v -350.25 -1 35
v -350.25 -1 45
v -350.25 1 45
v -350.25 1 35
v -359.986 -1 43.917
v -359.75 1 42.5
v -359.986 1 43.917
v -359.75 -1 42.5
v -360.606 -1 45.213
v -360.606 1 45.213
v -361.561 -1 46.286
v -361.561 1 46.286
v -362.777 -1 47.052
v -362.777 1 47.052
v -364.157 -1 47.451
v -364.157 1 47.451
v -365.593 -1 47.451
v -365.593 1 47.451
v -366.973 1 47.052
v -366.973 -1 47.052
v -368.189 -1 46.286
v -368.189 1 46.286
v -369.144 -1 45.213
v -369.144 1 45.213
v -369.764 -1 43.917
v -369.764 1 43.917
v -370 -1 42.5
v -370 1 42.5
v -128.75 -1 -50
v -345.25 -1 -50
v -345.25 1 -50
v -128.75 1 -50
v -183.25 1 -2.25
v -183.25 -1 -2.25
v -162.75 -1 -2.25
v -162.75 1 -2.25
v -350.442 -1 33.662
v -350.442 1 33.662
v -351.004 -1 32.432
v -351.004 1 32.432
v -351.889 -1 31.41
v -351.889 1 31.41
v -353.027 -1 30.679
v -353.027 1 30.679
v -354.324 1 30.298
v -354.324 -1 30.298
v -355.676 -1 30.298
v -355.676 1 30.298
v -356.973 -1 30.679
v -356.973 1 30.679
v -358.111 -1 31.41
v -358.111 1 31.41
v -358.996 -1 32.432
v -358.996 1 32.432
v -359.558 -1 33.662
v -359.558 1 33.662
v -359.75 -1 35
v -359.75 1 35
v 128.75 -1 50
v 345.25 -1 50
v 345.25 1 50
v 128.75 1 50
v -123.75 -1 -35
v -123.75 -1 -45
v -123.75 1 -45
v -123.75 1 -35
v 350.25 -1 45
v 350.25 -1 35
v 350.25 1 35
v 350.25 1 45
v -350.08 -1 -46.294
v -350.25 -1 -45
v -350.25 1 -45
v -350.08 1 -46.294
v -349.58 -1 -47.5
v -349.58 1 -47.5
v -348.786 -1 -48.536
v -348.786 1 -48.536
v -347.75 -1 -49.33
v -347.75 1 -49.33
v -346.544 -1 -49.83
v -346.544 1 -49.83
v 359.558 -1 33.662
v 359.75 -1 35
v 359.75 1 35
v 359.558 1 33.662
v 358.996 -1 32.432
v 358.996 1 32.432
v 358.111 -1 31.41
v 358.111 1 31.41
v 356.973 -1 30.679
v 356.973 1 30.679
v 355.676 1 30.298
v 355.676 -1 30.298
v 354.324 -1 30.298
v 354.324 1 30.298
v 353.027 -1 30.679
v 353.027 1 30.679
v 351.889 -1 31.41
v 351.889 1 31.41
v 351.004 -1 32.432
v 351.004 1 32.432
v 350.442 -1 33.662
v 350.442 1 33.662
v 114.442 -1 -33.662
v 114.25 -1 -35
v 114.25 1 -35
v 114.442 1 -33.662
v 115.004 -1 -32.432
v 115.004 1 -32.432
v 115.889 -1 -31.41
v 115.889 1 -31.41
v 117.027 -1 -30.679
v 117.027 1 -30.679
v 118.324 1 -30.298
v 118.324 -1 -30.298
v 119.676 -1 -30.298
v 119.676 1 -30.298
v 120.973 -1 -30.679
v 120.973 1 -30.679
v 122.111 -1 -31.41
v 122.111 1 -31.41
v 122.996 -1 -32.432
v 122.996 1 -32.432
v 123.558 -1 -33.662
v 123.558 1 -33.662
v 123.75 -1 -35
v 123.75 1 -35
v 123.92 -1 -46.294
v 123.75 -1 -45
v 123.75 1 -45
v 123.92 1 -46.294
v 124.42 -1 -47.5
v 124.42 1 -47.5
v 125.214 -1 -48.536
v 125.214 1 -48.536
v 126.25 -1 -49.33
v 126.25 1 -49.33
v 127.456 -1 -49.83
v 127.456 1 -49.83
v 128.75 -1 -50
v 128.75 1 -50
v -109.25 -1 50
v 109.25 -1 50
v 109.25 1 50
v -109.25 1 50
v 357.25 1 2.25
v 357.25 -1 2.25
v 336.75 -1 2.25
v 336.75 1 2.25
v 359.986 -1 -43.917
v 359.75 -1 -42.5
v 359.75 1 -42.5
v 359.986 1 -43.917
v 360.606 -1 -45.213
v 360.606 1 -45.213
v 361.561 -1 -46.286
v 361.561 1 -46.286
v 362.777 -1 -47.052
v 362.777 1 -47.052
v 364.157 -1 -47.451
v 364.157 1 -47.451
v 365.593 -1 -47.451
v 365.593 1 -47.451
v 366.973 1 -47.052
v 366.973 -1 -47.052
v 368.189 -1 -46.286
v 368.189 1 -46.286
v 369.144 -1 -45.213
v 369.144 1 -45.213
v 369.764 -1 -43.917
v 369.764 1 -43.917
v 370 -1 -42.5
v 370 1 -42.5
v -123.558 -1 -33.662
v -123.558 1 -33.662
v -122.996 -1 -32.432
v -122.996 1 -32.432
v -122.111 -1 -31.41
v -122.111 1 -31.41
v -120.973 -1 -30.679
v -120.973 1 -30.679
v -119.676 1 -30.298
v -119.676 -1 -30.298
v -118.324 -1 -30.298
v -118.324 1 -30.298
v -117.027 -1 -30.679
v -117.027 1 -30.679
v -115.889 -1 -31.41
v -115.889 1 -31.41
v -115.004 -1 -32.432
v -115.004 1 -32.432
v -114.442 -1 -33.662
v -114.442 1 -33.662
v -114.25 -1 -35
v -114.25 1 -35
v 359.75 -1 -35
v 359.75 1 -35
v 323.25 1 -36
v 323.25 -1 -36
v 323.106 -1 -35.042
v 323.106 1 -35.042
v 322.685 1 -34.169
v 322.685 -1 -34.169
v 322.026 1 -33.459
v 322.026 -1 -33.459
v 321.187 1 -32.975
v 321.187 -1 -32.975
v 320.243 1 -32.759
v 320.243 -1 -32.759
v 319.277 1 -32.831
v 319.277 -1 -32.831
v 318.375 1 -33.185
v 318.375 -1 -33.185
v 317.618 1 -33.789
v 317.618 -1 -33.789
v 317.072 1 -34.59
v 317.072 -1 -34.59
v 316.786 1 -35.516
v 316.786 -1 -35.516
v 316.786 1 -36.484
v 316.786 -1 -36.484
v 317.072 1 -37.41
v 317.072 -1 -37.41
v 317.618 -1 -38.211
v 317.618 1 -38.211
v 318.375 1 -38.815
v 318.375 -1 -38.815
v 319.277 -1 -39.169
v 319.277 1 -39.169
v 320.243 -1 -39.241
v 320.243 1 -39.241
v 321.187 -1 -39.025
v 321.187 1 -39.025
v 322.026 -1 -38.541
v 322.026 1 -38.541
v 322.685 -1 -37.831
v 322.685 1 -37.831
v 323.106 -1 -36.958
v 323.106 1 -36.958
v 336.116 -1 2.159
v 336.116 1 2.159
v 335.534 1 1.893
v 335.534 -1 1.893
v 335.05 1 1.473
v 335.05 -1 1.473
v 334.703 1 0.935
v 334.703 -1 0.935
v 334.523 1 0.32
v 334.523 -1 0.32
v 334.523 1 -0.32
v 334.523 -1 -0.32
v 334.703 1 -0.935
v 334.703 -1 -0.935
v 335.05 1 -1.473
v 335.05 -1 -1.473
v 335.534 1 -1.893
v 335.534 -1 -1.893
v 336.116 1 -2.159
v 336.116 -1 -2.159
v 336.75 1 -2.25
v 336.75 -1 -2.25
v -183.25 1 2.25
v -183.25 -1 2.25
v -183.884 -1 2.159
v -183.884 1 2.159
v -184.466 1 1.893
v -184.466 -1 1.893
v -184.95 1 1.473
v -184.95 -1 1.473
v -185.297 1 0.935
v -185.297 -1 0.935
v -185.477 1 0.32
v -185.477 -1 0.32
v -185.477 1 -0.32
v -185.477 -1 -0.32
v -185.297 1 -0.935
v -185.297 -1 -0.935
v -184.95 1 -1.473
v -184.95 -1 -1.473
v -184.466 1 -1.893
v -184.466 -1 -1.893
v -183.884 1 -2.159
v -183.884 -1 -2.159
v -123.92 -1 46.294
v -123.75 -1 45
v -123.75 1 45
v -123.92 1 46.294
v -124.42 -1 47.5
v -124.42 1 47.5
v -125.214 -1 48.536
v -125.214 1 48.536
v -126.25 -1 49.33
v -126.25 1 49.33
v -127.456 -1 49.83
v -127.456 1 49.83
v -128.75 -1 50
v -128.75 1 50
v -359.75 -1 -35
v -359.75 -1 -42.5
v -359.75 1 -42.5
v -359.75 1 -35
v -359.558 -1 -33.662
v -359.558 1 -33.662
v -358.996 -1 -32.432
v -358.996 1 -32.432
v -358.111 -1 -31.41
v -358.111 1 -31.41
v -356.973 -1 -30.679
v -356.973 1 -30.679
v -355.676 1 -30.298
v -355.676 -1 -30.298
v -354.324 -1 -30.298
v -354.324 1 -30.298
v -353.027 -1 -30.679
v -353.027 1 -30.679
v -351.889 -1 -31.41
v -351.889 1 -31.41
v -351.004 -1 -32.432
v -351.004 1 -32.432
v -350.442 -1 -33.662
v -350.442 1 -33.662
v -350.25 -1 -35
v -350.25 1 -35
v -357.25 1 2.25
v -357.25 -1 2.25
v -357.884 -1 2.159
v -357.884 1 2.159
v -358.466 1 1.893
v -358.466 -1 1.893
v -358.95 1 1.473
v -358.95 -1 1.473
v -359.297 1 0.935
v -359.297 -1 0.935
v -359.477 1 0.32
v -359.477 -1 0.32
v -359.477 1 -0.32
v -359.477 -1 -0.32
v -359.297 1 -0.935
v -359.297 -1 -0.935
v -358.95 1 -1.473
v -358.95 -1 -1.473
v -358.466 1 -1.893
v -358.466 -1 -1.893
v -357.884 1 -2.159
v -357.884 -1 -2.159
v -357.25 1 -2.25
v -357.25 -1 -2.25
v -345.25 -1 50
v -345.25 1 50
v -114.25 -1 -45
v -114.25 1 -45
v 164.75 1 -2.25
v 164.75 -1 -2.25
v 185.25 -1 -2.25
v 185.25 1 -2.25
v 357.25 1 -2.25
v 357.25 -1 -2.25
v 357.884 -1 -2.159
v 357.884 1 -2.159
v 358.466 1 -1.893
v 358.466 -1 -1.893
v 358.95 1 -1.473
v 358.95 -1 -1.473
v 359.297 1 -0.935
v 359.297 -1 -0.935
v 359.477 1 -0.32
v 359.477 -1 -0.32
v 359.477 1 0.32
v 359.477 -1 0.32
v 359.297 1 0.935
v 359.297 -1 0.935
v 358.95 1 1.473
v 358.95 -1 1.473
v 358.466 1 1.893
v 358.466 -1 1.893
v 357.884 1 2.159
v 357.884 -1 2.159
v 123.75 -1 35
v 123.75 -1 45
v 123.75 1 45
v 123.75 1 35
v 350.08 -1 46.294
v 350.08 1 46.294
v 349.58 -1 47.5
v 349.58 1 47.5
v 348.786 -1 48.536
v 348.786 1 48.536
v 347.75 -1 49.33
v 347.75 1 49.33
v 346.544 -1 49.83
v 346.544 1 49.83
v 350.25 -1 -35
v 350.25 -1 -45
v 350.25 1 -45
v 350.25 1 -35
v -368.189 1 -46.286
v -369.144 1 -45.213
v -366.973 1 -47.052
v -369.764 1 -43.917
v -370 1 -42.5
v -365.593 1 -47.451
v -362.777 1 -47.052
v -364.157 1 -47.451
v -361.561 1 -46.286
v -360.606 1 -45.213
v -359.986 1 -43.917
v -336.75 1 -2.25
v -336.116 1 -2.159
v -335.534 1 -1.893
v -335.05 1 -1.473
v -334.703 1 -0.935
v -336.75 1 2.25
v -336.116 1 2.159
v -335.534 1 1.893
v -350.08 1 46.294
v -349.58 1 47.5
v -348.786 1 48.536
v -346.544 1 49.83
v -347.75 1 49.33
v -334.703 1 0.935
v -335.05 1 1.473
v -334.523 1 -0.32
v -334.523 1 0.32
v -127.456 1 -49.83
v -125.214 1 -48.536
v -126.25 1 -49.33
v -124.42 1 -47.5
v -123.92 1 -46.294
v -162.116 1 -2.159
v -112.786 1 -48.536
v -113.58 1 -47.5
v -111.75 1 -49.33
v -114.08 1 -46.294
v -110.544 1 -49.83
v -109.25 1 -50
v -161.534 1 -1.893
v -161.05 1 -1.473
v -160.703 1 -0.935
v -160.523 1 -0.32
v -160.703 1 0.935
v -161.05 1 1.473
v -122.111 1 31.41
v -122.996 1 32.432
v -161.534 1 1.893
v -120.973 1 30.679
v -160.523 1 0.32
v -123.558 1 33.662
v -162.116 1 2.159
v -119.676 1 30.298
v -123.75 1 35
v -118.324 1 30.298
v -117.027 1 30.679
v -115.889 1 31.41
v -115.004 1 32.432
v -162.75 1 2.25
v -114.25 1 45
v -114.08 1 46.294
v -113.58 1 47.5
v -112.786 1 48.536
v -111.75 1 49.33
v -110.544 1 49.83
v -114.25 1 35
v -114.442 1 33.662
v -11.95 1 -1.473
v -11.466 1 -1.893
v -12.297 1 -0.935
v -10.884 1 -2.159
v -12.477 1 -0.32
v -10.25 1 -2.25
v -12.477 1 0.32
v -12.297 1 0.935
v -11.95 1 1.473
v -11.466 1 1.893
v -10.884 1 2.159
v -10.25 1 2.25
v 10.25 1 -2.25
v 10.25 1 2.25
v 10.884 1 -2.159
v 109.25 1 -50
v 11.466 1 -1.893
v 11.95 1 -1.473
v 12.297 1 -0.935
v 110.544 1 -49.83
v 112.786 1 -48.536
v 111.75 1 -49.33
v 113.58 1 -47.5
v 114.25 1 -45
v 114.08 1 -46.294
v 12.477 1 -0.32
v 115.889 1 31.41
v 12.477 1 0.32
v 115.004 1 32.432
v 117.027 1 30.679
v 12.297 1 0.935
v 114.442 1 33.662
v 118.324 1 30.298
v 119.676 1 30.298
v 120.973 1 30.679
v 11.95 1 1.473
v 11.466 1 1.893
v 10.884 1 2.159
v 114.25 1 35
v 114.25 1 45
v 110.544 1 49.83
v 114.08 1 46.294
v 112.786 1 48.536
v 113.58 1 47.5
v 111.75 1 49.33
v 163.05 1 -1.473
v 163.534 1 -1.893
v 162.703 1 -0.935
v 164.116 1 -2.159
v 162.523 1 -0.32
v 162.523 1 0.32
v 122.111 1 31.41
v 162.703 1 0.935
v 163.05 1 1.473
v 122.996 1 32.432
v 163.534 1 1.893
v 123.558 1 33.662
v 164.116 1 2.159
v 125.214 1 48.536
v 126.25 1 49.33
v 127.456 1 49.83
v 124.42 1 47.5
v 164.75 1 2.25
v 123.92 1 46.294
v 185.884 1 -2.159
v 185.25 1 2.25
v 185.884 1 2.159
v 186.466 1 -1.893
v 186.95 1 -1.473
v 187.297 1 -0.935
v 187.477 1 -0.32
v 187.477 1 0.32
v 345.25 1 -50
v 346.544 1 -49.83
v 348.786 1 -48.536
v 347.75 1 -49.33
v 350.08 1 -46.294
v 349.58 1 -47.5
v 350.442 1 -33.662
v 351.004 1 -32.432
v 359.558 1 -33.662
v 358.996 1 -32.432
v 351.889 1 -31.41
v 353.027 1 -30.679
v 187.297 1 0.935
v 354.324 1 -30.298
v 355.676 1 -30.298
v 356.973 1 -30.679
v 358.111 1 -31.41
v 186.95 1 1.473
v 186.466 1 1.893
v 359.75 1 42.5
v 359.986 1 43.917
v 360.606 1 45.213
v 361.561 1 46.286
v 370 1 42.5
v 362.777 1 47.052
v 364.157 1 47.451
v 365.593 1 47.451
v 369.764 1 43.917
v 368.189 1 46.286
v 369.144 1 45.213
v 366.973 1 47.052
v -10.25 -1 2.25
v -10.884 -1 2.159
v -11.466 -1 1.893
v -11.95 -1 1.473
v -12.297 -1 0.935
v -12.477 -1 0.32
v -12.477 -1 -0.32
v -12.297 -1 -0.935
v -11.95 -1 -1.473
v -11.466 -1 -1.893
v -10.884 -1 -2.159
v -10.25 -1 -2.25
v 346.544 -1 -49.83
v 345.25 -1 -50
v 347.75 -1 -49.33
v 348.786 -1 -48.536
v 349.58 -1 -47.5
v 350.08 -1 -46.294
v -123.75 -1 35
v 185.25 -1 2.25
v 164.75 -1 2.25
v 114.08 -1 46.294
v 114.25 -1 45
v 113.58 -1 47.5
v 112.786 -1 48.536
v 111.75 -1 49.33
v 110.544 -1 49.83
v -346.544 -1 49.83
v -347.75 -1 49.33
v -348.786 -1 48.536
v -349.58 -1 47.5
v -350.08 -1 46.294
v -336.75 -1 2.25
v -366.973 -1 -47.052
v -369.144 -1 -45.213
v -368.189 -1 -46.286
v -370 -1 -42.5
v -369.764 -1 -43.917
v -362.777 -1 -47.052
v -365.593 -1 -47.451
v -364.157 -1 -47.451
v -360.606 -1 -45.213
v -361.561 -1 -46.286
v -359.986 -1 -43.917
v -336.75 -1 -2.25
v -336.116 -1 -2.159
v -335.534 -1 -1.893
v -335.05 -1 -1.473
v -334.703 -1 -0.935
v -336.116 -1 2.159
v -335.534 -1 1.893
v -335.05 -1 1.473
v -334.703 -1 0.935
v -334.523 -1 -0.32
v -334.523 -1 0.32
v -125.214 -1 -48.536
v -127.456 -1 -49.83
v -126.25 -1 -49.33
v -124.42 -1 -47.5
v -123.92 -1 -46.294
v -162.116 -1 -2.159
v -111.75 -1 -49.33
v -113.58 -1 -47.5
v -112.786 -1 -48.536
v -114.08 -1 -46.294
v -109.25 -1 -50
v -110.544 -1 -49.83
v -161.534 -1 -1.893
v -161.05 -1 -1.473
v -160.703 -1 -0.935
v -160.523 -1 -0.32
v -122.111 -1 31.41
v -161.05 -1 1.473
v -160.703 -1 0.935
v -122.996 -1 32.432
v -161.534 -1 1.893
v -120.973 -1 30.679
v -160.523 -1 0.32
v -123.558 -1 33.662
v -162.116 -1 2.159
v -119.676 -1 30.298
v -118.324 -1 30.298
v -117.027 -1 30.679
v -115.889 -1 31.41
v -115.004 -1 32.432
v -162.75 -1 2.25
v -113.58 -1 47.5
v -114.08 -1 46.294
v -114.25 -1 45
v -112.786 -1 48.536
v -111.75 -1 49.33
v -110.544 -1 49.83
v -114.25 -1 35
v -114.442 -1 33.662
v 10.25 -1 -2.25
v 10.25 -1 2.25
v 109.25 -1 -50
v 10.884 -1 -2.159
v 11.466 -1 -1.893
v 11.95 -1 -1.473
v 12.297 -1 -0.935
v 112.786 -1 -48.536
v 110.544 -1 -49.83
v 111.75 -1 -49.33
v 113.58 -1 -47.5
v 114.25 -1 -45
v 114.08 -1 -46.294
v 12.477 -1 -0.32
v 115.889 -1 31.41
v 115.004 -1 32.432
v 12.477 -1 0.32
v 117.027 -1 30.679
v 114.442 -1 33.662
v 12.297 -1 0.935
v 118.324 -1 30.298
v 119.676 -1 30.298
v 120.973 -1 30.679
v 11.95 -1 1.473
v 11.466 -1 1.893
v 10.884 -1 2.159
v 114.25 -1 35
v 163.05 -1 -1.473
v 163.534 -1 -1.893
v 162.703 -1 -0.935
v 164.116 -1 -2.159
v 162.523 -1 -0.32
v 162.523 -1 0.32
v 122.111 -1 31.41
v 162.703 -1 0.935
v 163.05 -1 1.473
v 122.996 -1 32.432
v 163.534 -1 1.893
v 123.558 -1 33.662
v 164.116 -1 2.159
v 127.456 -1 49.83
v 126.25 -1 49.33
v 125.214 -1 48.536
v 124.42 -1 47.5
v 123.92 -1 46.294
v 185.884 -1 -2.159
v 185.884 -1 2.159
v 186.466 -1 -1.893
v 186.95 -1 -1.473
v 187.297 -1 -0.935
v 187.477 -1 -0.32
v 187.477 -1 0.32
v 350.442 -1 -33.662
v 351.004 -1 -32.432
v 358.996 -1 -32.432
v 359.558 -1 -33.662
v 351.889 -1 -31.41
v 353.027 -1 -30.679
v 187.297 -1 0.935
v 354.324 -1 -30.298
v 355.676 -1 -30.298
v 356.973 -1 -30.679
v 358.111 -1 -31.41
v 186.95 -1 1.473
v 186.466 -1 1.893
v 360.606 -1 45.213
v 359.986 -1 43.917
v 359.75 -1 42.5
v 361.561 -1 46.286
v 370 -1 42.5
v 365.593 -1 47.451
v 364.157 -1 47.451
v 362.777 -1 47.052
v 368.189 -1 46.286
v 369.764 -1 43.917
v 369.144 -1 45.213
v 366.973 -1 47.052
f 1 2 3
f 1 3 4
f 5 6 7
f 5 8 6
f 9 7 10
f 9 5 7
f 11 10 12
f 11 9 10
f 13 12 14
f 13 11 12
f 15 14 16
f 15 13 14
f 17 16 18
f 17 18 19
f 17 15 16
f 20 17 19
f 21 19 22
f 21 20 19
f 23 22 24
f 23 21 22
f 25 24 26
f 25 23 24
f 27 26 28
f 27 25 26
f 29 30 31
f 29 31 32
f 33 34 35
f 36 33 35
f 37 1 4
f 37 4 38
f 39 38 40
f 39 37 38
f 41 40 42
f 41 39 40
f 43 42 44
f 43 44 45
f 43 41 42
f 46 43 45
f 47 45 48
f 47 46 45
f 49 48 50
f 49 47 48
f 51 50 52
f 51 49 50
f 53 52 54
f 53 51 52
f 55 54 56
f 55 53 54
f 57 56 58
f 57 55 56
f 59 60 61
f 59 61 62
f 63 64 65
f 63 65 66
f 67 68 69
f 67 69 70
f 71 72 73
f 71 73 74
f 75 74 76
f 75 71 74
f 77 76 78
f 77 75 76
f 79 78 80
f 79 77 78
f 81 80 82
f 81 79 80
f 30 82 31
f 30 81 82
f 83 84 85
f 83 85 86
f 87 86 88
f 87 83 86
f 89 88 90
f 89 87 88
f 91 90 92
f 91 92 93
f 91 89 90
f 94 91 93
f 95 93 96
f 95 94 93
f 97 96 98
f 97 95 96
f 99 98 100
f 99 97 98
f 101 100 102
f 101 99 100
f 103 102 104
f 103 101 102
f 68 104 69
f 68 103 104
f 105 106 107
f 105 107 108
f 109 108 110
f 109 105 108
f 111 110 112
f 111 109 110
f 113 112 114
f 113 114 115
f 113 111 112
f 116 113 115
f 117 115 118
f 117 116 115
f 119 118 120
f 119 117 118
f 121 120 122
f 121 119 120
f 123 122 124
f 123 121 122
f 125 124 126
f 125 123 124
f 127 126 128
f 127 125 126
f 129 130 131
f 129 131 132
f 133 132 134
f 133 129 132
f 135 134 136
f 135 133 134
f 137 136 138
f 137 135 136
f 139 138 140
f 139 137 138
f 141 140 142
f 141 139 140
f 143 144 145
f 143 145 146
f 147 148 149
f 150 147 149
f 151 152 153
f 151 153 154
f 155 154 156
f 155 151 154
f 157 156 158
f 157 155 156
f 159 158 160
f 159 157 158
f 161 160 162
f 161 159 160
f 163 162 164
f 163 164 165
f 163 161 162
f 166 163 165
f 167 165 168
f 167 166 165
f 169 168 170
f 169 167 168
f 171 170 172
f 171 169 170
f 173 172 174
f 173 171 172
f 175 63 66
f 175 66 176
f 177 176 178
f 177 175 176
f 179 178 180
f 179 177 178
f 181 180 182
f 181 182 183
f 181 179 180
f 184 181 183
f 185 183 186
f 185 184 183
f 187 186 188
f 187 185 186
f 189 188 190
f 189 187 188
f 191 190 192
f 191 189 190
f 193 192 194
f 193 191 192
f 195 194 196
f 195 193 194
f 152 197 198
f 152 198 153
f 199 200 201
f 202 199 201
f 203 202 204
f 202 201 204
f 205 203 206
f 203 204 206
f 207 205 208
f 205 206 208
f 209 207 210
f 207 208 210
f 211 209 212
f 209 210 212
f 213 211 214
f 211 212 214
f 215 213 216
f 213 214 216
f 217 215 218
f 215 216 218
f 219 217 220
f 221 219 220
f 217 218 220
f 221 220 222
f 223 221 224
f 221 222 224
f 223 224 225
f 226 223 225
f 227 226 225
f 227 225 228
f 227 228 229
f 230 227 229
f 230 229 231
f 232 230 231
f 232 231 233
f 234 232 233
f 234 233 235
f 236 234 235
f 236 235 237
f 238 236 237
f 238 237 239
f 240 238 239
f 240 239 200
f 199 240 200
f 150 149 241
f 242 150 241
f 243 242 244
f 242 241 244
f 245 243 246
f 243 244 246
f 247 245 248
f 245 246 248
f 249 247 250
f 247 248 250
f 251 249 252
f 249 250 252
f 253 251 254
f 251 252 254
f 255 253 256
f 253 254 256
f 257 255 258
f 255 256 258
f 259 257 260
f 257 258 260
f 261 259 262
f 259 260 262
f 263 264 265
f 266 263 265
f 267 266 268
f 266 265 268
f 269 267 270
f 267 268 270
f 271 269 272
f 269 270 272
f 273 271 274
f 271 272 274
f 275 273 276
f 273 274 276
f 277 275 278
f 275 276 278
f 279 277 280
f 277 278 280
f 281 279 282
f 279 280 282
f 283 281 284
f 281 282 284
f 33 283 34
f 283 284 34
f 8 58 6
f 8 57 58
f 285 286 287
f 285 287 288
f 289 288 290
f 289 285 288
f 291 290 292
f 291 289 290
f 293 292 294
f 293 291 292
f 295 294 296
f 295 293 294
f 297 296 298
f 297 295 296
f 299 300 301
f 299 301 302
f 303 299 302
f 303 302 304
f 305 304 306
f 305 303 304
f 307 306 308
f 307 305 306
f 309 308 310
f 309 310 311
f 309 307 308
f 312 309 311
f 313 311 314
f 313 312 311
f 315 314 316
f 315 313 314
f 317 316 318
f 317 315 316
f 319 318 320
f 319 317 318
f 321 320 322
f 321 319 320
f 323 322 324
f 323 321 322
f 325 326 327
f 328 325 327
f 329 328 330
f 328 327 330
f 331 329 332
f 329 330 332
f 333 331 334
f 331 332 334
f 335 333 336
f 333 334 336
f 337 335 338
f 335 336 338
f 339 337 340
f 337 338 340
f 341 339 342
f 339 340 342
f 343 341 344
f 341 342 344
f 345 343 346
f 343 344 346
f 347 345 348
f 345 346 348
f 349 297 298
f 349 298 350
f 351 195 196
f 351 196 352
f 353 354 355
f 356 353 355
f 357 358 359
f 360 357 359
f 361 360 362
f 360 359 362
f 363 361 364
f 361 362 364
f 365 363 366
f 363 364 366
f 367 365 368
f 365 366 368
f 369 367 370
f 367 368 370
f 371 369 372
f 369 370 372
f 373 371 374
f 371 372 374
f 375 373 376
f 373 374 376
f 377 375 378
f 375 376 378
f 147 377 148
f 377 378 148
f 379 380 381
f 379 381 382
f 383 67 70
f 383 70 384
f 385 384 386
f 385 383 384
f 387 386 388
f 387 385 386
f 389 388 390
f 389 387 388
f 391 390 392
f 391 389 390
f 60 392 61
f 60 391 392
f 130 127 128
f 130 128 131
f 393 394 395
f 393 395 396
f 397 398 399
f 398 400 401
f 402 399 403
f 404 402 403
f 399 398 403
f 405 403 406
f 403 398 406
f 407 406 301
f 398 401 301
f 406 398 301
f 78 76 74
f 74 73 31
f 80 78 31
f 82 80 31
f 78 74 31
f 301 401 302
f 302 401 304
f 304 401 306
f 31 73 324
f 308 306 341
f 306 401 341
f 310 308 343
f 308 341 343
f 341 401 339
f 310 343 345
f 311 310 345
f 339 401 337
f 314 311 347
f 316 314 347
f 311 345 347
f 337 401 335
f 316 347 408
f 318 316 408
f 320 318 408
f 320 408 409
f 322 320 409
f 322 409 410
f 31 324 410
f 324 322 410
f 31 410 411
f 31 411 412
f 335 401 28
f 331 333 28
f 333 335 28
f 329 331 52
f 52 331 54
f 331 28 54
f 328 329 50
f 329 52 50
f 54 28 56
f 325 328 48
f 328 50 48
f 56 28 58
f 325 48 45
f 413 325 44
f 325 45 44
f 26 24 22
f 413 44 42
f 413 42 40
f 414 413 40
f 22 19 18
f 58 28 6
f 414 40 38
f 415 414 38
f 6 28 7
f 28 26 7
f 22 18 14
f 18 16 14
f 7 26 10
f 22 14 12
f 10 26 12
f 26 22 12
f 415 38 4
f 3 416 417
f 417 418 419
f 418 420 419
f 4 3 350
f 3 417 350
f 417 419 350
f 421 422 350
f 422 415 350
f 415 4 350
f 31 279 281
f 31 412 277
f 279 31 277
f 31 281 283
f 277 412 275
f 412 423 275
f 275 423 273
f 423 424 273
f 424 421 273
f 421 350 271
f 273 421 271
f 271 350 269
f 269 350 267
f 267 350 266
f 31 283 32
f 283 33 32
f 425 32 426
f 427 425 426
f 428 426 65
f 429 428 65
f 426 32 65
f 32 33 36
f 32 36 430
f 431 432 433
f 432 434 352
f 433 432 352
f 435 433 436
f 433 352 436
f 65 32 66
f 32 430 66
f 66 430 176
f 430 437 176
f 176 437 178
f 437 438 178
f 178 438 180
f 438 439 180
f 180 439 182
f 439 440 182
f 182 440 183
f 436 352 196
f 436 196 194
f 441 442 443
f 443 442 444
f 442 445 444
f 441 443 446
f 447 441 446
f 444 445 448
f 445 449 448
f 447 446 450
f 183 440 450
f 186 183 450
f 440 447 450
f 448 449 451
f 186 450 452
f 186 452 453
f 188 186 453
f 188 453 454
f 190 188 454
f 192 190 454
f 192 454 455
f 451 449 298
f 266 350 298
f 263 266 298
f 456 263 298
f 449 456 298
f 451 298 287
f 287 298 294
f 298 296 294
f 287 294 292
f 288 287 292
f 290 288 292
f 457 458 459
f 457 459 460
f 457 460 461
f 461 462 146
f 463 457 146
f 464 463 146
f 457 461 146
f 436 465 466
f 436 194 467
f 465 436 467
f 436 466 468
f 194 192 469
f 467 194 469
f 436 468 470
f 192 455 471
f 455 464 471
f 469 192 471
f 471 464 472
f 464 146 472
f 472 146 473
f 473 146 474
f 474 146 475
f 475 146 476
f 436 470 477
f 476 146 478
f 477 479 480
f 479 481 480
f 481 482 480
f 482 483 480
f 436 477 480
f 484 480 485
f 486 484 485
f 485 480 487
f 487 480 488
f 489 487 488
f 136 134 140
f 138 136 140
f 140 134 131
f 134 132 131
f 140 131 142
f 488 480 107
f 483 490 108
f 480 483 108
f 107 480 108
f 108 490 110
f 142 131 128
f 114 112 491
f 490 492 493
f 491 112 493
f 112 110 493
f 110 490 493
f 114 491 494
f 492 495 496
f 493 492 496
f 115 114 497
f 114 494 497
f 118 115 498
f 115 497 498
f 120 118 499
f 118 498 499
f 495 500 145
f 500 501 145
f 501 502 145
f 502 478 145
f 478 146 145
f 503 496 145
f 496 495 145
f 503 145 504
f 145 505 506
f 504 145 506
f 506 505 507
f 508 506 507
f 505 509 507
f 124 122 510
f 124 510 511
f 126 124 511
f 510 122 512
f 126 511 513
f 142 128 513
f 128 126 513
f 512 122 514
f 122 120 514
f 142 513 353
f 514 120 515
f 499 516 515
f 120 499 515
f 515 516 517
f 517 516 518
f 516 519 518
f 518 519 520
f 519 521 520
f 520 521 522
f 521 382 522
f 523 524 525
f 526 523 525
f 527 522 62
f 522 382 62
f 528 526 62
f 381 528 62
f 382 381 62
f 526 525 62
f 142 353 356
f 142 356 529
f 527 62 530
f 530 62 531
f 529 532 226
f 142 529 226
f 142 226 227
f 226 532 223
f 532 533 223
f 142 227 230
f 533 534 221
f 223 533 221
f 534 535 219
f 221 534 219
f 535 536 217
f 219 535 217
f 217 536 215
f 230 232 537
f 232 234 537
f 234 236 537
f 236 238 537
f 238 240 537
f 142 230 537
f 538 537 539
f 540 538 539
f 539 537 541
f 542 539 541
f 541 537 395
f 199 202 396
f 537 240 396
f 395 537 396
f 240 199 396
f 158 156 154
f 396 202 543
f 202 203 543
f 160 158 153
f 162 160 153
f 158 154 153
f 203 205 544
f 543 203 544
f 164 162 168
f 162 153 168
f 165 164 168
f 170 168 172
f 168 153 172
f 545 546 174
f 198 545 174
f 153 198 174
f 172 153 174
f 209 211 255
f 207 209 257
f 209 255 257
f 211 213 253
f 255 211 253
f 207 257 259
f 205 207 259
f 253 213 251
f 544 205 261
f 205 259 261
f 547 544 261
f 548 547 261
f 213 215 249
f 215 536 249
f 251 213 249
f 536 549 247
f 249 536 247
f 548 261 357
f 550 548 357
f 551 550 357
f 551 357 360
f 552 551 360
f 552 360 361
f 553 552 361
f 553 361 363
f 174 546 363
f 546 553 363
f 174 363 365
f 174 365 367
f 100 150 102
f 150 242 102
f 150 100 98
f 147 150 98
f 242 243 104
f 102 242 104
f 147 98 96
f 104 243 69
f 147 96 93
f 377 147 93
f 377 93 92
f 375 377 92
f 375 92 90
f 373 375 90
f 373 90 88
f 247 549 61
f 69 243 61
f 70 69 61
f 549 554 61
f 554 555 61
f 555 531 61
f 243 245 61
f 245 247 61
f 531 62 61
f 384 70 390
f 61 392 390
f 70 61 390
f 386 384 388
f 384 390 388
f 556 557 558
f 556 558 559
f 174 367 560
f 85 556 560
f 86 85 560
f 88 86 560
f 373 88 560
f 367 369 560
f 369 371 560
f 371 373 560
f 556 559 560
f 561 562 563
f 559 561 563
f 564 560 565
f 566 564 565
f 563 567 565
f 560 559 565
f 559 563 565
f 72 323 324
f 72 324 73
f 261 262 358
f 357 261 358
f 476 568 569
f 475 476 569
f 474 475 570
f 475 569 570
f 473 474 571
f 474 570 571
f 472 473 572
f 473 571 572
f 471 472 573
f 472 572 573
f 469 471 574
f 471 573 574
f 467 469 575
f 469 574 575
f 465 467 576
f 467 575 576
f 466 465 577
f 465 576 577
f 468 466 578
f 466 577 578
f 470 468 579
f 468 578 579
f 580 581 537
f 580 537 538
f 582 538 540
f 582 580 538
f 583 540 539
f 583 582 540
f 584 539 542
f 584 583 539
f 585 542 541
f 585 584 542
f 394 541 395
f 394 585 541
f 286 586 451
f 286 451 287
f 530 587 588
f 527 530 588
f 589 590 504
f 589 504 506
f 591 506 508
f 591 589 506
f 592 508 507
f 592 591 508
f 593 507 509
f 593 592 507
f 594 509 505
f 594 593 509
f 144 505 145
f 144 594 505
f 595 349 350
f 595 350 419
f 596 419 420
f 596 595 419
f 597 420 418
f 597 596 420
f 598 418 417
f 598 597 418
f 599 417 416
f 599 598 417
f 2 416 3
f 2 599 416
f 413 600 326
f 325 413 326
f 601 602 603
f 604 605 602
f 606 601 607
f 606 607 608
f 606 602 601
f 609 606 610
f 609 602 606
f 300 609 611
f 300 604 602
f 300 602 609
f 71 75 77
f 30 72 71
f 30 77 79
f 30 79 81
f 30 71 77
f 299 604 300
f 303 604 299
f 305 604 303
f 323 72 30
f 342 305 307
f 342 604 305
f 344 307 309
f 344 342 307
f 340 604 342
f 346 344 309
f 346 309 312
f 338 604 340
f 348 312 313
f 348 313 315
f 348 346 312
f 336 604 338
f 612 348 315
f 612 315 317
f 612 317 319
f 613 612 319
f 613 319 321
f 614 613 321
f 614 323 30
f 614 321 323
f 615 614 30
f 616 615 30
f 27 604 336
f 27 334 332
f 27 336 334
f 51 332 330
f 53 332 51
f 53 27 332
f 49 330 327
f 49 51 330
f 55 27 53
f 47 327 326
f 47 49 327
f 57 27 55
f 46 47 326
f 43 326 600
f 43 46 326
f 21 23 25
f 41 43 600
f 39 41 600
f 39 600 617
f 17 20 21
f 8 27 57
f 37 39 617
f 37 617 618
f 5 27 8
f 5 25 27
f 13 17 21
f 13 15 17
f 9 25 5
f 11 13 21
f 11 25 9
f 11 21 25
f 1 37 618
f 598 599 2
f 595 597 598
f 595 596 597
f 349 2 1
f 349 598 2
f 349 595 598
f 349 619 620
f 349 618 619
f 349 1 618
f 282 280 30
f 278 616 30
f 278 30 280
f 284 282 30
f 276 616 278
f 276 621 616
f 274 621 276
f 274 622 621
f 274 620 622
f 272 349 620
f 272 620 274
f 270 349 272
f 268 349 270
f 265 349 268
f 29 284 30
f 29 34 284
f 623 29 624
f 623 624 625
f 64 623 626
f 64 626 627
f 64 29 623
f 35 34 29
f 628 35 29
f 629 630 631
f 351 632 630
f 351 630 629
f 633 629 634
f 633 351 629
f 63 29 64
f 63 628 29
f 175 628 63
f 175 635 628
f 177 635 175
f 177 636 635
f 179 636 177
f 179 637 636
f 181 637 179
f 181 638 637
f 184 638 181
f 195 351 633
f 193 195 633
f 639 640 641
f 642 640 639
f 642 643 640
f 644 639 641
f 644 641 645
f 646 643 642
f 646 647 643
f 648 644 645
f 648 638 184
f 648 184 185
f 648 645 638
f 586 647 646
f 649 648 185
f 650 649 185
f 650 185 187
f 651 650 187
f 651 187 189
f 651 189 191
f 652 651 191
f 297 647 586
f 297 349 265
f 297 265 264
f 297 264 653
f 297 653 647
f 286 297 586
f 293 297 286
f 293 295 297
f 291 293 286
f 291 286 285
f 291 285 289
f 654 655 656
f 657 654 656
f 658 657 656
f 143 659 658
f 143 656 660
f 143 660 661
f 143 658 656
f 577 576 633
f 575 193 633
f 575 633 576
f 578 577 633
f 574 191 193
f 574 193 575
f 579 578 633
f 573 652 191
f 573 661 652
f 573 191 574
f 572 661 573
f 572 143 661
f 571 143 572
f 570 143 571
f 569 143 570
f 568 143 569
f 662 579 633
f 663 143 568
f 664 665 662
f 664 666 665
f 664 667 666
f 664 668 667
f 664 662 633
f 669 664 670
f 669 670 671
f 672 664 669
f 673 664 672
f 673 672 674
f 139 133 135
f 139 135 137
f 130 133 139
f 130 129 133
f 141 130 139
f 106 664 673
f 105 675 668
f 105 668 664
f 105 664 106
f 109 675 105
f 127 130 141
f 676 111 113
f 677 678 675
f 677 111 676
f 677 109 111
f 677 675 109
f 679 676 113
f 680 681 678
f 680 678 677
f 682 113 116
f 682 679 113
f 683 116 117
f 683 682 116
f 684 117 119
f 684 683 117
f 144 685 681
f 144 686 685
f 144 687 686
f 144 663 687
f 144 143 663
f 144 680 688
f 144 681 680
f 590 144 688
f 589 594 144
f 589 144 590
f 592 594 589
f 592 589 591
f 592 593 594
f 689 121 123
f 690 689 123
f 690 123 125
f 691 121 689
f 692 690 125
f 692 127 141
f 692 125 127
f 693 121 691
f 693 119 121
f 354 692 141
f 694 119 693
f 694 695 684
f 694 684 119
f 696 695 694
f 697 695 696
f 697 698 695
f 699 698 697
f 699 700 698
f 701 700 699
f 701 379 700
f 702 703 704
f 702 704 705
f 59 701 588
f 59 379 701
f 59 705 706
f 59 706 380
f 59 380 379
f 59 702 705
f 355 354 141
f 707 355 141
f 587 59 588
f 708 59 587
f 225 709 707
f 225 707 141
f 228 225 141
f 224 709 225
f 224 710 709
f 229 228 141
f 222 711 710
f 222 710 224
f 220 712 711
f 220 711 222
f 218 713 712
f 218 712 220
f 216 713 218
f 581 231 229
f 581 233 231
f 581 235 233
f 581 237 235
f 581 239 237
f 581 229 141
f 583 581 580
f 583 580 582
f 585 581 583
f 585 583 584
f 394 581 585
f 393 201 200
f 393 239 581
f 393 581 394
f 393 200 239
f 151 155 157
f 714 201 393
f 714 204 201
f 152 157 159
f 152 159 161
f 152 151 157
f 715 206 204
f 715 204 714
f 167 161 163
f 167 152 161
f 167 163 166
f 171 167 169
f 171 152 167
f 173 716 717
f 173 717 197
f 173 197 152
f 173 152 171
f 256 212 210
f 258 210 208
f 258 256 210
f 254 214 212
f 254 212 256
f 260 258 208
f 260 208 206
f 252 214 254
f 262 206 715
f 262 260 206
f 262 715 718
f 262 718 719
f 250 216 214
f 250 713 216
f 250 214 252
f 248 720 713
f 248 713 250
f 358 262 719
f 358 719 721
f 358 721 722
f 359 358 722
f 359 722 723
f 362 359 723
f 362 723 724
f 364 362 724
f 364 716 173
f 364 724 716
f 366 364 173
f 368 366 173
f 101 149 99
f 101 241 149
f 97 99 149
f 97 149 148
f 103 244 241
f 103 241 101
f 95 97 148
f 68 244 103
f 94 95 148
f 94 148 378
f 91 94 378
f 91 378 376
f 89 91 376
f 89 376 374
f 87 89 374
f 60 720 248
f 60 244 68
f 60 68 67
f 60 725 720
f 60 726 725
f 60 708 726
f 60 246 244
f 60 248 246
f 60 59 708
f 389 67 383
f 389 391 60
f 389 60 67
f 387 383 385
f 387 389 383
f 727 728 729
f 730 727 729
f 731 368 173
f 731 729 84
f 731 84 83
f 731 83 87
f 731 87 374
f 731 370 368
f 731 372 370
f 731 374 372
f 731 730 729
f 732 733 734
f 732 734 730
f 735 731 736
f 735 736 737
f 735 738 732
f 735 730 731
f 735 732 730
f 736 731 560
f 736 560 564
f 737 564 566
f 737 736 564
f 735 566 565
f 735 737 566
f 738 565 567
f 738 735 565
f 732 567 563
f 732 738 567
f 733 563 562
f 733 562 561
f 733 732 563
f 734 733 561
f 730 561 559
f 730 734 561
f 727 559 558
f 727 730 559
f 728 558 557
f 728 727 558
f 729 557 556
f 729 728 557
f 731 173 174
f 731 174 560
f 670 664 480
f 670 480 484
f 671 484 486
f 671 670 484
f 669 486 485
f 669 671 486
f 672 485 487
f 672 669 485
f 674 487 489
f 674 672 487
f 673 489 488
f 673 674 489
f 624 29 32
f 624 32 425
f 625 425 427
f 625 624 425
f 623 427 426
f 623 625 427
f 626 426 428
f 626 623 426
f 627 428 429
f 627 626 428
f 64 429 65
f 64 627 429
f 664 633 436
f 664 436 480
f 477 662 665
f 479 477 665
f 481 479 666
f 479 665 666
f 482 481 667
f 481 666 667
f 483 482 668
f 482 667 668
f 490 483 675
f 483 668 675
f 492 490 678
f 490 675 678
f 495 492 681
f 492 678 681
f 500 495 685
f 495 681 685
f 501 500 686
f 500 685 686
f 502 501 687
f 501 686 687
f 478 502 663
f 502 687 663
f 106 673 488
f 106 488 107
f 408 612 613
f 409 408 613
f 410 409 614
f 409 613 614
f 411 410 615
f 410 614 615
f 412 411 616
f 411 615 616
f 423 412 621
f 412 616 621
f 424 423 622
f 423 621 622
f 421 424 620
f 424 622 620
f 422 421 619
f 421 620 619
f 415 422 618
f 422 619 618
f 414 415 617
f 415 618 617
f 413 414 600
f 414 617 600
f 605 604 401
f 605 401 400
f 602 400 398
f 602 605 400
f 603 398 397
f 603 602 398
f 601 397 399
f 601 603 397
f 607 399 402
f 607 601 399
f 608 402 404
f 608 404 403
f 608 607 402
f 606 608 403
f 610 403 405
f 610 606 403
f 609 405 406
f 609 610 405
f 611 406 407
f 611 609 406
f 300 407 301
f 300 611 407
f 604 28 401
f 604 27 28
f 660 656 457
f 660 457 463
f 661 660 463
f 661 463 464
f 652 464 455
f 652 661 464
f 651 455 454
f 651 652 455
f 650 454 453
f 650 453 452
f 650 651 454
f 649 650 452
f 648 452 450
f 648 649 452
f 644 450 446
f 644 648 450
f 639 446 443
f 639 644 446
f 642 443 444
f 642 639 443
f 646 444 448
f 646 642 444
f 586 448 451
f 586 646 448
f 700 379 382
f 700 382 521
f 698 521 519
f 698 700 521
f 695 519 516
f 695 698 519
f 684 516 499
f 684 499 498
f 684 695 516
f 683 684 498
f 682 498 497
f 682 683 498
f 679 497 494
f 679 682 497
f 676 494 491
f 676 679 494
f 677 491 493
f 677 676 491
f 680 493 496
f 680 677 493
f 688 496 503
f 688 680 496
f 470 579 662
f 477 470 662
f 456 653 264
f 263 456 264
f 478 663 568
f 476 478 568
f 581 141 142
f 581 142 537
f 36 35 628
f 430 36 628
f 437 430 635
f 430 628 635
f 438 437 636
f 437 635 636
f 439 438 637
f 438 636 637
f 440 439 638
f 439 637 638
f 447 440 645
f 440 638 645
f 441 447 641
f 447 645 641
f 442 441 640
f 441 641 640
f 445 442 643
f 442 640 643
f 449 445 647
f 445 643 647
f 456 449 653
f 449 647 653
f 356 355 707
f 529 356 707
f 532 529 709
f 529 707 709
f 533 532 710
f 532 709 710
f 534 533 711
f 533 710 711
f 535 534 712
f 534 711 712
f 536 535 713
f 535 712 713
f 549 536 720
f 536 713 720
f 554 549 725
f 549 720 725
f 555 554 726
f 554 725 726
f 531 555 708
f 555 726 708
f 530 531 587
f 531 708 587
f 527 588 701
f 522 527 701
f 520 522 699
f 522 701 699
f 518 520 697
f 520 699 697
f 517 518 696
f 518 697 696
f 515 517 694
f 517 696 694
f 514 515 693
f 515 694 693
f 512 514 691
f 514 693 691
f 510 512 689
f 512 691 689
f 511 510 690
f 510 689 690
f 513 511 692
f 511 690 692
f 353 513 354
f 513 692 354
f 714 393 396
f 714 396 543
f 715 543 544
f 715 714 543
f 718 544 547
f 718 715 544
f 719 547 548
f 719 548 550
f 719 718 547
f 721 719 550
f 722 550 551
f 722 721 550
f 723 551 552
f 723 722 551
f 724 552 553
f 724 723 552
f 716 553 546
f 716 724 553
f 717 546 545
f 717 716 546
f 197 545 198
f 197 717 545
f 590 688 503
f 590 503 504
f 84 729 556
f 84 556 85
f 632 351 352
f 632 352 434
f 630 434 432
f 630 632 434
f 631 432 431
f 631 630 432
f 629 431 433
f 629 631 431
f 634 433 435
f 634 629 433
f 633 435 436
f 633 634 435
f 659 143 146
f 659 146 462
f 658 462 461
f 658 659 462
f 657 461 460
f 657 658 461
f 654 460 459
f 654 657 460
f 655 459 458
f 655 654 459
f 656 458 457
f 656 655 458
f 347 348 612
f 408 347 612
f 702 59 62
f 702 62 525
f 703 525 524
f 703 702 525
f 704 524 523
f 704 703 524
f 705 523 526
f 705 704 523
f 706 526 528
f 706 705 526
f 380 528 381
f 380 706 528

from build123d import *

# Parameters (mm, degrees)
F1_DEPTH = 1
F3_DEPTH = 25
F4_R     = 3.25
F5_DEPTH = 25


with BuildPart() as f1:
    # F0 (on Front) → F1 (new body, symmetric)
    with BuildSketch(Plane.XZ):
        with BuildLine():
            Line((-370, 42.5), (-370, -42.5))
            ThreePointArc((-370, -42.5), (-364.875, -47.501144), (-359.75, -42.5))
            Line((-359.75, -42.5), (-359.75, -35))
            ThreePointArc((-359.75, -35), (-355, -30.25), (-350.25, -35))
            Line((-350.25, -35), (-350.25, -45))
            ThreePointArc((-350.25, -45), (-348.785534, -48.535534), (-345.25, -50))
            Line((-345.25, -50), (-128.75, -50))
            ThreePointArc((-128.75, -50), (-125.214466, -48.535534), (-123.75, -45))
            Line((-123.75, -45), (-123.75, -35))
            ThreePointArc((-123.75, -35), (-119, -30.25), (-114.25, -35))
            Line((-114.25, -35), (-114.25, -45))
            ThreePointArc((-114.25, -45), (-112.785534, -48.535534), (-109.25, -50))
            Line((-109.25, -50), (109.25, -50))
            ThreePointArc((109.25, -50), (112.785534, -48.535534), (114.25, -45))
            Line((114.25, -45), (114.25, -35))
            ThreePointArc((114.25, -35), (119, -30.25), (123.75, -35))
            Line((123.75, -35), (123.75, -45))
            ThreePointArc((123.75, -45), (125.214466, -48.535534), (128.75, -50))
            Line((128.75, -50), (345.25, -50))
            ThreePointArc((345.25, -50), (348.785534, -48.535534), (350.25, -45))
            Line((350.25, -45), (350.25, -35))
            ThreePointArc((350.25, -35), (355, -30.25), (359.75, -35))
            Line((359.75, -35), (359.75, -42.5))
            ThreePointArc((359.75, -42.5), (364.875, -47.501144), (370, -42.5))
            Line((370, -42.5), (370, 42.5))
            ThreePointArc((370, 42.5), (364.875, 47.501144), (359.75, 42.5))
            Line((359.75, 42.5), (359.75, 35))
            ThreePointArc((359.75, 35), (355, 30.25), (350.25, 35))
            Line((350.25, 35), (350.25, 45))
            ThreePointArc((350.25, 45), (348.785534, 48.535534), (345.25, 50))
            Line((345.25, 50), (128.75, 50))
            ThreePointArc((128.75, 50), (125.214466, 48.535534), (123.75, 45))
            Line((123.75, 45), (123.75, 35))
            ThreePointArc((123.75, 35), (119, 30.25), (114.25, 35))
            Line((114.25, 35), (114.25, 45))
            ThreePointArc((114.25, 45), (112.785534, 48.535534), (109.25, 50))
            Line((109.25, 50), (-109.25, 50))
            ThreePointArc((-109.25, 50), (-112.785534, 48.535534), (-114.25, 45))
            Line((-114.25, 45), (-114.25, 35))
            ThreePointArc((-114.25, 35), (-119, 30.25), (-123.75, 35))
            Line((-123.75, 35), (-123.75, 45))
            ThreePointArc((-123.75, 45), (-125.214466, 48.535534), (-128.75, 50))
            Line((-128.75, 50), (-345.25, 50))
            ThreePointArc((-345.25, 50), (-348.785534, 48.535534), (-350.25, 45))
            Line((-350.25, 45), (-350.25, 35))
            ThreePointArc((-350.25, 35), (-355, 30.25), (-359.75, 35))
            Line((-359.75, 35), (-359.75, 42.5))
            ThreePointArc((-359.75, 42.5), (-364.875, 47.501144), (-370, 42.5))
        make_face()
    extrude(amount=F1_DEPTH, both=True)

    # F2 (on face) → F3 (cut)
    with BuildSketch(Plane.XZ.offset(1)):
        with BuildLine():
            Line((-357.25, -2.25), (-336.75, -2.25))
            ThreePointArc((-336.75, -2.25), (-334.5, 0), (-336.75, 2.25))
            Line((-336.75, 2.25), (-357.25, 2.25))
            ThreePointArc((-357.25, 2.25), (-359.5, 0), (-357.25, -2.25))
        make_face()
        with BuildLine():
            Line((-183.25, -2.25), (-162.75, -2.25))
            ThreePointArc((-162.75, -2.25), (-160.5, 0), (-162.75, 2.25))
            Line((-162.75, 2.25), (-183.25, 2.25))
            ThreePointArc((-183.25, 2.25), (-185.5, 0), (-183.25, -2.25))
        make_face()
        with BuildLine():
            Line((-10.25, -2.25), (10.25, -2.25))
            ThreePointArc((10.25, -2.25), (12.5, 0), (10.25, 2.25))
            Line((10.25, 2.25), (-10.25, 2.25))
            ThreePointArc((-10.25, 2.25), (-12.5, 0), (-10.25, -2.25))
        make_face()
        with BuildLine():
            Line((164.75, -2.25), (185.25, -2.25))
            ThreePointArc((185.25, -2.25), (187.5, 0), (185.25, 2.25))
            Line((185.25, 2.25), (164.75, 2.25))
            ThreePointArc((164.75, 2.25), (162.5, 0), (164.75, -2.25))
        make_face()
        with BuildLine():
            Line((336.75, -2.25), (357.25, -2.25))
            ThreePointArc((357.25, -2.25), (359.5, 0), (357.25, 2.25))
            Line((357.25, 2.25), (336.75, 2.25))
            ThreePointArc((336.75, 2.25), (334.5, 0), (336.75, -2.25))
        make_face()
    extrude(amount=-F3_DEPTH, mode=Mode.SUBTRACT)

    # F4 (on face) → F5 (cut)
    with BuildSketch(Plane.XZ.offset(1)):
        with Locations((320, -36)):
            Circle(F4_R)
    extrude(amount=-F5_DEPTH, mode=Mode.SUBTRACT)


solid = f1.part
